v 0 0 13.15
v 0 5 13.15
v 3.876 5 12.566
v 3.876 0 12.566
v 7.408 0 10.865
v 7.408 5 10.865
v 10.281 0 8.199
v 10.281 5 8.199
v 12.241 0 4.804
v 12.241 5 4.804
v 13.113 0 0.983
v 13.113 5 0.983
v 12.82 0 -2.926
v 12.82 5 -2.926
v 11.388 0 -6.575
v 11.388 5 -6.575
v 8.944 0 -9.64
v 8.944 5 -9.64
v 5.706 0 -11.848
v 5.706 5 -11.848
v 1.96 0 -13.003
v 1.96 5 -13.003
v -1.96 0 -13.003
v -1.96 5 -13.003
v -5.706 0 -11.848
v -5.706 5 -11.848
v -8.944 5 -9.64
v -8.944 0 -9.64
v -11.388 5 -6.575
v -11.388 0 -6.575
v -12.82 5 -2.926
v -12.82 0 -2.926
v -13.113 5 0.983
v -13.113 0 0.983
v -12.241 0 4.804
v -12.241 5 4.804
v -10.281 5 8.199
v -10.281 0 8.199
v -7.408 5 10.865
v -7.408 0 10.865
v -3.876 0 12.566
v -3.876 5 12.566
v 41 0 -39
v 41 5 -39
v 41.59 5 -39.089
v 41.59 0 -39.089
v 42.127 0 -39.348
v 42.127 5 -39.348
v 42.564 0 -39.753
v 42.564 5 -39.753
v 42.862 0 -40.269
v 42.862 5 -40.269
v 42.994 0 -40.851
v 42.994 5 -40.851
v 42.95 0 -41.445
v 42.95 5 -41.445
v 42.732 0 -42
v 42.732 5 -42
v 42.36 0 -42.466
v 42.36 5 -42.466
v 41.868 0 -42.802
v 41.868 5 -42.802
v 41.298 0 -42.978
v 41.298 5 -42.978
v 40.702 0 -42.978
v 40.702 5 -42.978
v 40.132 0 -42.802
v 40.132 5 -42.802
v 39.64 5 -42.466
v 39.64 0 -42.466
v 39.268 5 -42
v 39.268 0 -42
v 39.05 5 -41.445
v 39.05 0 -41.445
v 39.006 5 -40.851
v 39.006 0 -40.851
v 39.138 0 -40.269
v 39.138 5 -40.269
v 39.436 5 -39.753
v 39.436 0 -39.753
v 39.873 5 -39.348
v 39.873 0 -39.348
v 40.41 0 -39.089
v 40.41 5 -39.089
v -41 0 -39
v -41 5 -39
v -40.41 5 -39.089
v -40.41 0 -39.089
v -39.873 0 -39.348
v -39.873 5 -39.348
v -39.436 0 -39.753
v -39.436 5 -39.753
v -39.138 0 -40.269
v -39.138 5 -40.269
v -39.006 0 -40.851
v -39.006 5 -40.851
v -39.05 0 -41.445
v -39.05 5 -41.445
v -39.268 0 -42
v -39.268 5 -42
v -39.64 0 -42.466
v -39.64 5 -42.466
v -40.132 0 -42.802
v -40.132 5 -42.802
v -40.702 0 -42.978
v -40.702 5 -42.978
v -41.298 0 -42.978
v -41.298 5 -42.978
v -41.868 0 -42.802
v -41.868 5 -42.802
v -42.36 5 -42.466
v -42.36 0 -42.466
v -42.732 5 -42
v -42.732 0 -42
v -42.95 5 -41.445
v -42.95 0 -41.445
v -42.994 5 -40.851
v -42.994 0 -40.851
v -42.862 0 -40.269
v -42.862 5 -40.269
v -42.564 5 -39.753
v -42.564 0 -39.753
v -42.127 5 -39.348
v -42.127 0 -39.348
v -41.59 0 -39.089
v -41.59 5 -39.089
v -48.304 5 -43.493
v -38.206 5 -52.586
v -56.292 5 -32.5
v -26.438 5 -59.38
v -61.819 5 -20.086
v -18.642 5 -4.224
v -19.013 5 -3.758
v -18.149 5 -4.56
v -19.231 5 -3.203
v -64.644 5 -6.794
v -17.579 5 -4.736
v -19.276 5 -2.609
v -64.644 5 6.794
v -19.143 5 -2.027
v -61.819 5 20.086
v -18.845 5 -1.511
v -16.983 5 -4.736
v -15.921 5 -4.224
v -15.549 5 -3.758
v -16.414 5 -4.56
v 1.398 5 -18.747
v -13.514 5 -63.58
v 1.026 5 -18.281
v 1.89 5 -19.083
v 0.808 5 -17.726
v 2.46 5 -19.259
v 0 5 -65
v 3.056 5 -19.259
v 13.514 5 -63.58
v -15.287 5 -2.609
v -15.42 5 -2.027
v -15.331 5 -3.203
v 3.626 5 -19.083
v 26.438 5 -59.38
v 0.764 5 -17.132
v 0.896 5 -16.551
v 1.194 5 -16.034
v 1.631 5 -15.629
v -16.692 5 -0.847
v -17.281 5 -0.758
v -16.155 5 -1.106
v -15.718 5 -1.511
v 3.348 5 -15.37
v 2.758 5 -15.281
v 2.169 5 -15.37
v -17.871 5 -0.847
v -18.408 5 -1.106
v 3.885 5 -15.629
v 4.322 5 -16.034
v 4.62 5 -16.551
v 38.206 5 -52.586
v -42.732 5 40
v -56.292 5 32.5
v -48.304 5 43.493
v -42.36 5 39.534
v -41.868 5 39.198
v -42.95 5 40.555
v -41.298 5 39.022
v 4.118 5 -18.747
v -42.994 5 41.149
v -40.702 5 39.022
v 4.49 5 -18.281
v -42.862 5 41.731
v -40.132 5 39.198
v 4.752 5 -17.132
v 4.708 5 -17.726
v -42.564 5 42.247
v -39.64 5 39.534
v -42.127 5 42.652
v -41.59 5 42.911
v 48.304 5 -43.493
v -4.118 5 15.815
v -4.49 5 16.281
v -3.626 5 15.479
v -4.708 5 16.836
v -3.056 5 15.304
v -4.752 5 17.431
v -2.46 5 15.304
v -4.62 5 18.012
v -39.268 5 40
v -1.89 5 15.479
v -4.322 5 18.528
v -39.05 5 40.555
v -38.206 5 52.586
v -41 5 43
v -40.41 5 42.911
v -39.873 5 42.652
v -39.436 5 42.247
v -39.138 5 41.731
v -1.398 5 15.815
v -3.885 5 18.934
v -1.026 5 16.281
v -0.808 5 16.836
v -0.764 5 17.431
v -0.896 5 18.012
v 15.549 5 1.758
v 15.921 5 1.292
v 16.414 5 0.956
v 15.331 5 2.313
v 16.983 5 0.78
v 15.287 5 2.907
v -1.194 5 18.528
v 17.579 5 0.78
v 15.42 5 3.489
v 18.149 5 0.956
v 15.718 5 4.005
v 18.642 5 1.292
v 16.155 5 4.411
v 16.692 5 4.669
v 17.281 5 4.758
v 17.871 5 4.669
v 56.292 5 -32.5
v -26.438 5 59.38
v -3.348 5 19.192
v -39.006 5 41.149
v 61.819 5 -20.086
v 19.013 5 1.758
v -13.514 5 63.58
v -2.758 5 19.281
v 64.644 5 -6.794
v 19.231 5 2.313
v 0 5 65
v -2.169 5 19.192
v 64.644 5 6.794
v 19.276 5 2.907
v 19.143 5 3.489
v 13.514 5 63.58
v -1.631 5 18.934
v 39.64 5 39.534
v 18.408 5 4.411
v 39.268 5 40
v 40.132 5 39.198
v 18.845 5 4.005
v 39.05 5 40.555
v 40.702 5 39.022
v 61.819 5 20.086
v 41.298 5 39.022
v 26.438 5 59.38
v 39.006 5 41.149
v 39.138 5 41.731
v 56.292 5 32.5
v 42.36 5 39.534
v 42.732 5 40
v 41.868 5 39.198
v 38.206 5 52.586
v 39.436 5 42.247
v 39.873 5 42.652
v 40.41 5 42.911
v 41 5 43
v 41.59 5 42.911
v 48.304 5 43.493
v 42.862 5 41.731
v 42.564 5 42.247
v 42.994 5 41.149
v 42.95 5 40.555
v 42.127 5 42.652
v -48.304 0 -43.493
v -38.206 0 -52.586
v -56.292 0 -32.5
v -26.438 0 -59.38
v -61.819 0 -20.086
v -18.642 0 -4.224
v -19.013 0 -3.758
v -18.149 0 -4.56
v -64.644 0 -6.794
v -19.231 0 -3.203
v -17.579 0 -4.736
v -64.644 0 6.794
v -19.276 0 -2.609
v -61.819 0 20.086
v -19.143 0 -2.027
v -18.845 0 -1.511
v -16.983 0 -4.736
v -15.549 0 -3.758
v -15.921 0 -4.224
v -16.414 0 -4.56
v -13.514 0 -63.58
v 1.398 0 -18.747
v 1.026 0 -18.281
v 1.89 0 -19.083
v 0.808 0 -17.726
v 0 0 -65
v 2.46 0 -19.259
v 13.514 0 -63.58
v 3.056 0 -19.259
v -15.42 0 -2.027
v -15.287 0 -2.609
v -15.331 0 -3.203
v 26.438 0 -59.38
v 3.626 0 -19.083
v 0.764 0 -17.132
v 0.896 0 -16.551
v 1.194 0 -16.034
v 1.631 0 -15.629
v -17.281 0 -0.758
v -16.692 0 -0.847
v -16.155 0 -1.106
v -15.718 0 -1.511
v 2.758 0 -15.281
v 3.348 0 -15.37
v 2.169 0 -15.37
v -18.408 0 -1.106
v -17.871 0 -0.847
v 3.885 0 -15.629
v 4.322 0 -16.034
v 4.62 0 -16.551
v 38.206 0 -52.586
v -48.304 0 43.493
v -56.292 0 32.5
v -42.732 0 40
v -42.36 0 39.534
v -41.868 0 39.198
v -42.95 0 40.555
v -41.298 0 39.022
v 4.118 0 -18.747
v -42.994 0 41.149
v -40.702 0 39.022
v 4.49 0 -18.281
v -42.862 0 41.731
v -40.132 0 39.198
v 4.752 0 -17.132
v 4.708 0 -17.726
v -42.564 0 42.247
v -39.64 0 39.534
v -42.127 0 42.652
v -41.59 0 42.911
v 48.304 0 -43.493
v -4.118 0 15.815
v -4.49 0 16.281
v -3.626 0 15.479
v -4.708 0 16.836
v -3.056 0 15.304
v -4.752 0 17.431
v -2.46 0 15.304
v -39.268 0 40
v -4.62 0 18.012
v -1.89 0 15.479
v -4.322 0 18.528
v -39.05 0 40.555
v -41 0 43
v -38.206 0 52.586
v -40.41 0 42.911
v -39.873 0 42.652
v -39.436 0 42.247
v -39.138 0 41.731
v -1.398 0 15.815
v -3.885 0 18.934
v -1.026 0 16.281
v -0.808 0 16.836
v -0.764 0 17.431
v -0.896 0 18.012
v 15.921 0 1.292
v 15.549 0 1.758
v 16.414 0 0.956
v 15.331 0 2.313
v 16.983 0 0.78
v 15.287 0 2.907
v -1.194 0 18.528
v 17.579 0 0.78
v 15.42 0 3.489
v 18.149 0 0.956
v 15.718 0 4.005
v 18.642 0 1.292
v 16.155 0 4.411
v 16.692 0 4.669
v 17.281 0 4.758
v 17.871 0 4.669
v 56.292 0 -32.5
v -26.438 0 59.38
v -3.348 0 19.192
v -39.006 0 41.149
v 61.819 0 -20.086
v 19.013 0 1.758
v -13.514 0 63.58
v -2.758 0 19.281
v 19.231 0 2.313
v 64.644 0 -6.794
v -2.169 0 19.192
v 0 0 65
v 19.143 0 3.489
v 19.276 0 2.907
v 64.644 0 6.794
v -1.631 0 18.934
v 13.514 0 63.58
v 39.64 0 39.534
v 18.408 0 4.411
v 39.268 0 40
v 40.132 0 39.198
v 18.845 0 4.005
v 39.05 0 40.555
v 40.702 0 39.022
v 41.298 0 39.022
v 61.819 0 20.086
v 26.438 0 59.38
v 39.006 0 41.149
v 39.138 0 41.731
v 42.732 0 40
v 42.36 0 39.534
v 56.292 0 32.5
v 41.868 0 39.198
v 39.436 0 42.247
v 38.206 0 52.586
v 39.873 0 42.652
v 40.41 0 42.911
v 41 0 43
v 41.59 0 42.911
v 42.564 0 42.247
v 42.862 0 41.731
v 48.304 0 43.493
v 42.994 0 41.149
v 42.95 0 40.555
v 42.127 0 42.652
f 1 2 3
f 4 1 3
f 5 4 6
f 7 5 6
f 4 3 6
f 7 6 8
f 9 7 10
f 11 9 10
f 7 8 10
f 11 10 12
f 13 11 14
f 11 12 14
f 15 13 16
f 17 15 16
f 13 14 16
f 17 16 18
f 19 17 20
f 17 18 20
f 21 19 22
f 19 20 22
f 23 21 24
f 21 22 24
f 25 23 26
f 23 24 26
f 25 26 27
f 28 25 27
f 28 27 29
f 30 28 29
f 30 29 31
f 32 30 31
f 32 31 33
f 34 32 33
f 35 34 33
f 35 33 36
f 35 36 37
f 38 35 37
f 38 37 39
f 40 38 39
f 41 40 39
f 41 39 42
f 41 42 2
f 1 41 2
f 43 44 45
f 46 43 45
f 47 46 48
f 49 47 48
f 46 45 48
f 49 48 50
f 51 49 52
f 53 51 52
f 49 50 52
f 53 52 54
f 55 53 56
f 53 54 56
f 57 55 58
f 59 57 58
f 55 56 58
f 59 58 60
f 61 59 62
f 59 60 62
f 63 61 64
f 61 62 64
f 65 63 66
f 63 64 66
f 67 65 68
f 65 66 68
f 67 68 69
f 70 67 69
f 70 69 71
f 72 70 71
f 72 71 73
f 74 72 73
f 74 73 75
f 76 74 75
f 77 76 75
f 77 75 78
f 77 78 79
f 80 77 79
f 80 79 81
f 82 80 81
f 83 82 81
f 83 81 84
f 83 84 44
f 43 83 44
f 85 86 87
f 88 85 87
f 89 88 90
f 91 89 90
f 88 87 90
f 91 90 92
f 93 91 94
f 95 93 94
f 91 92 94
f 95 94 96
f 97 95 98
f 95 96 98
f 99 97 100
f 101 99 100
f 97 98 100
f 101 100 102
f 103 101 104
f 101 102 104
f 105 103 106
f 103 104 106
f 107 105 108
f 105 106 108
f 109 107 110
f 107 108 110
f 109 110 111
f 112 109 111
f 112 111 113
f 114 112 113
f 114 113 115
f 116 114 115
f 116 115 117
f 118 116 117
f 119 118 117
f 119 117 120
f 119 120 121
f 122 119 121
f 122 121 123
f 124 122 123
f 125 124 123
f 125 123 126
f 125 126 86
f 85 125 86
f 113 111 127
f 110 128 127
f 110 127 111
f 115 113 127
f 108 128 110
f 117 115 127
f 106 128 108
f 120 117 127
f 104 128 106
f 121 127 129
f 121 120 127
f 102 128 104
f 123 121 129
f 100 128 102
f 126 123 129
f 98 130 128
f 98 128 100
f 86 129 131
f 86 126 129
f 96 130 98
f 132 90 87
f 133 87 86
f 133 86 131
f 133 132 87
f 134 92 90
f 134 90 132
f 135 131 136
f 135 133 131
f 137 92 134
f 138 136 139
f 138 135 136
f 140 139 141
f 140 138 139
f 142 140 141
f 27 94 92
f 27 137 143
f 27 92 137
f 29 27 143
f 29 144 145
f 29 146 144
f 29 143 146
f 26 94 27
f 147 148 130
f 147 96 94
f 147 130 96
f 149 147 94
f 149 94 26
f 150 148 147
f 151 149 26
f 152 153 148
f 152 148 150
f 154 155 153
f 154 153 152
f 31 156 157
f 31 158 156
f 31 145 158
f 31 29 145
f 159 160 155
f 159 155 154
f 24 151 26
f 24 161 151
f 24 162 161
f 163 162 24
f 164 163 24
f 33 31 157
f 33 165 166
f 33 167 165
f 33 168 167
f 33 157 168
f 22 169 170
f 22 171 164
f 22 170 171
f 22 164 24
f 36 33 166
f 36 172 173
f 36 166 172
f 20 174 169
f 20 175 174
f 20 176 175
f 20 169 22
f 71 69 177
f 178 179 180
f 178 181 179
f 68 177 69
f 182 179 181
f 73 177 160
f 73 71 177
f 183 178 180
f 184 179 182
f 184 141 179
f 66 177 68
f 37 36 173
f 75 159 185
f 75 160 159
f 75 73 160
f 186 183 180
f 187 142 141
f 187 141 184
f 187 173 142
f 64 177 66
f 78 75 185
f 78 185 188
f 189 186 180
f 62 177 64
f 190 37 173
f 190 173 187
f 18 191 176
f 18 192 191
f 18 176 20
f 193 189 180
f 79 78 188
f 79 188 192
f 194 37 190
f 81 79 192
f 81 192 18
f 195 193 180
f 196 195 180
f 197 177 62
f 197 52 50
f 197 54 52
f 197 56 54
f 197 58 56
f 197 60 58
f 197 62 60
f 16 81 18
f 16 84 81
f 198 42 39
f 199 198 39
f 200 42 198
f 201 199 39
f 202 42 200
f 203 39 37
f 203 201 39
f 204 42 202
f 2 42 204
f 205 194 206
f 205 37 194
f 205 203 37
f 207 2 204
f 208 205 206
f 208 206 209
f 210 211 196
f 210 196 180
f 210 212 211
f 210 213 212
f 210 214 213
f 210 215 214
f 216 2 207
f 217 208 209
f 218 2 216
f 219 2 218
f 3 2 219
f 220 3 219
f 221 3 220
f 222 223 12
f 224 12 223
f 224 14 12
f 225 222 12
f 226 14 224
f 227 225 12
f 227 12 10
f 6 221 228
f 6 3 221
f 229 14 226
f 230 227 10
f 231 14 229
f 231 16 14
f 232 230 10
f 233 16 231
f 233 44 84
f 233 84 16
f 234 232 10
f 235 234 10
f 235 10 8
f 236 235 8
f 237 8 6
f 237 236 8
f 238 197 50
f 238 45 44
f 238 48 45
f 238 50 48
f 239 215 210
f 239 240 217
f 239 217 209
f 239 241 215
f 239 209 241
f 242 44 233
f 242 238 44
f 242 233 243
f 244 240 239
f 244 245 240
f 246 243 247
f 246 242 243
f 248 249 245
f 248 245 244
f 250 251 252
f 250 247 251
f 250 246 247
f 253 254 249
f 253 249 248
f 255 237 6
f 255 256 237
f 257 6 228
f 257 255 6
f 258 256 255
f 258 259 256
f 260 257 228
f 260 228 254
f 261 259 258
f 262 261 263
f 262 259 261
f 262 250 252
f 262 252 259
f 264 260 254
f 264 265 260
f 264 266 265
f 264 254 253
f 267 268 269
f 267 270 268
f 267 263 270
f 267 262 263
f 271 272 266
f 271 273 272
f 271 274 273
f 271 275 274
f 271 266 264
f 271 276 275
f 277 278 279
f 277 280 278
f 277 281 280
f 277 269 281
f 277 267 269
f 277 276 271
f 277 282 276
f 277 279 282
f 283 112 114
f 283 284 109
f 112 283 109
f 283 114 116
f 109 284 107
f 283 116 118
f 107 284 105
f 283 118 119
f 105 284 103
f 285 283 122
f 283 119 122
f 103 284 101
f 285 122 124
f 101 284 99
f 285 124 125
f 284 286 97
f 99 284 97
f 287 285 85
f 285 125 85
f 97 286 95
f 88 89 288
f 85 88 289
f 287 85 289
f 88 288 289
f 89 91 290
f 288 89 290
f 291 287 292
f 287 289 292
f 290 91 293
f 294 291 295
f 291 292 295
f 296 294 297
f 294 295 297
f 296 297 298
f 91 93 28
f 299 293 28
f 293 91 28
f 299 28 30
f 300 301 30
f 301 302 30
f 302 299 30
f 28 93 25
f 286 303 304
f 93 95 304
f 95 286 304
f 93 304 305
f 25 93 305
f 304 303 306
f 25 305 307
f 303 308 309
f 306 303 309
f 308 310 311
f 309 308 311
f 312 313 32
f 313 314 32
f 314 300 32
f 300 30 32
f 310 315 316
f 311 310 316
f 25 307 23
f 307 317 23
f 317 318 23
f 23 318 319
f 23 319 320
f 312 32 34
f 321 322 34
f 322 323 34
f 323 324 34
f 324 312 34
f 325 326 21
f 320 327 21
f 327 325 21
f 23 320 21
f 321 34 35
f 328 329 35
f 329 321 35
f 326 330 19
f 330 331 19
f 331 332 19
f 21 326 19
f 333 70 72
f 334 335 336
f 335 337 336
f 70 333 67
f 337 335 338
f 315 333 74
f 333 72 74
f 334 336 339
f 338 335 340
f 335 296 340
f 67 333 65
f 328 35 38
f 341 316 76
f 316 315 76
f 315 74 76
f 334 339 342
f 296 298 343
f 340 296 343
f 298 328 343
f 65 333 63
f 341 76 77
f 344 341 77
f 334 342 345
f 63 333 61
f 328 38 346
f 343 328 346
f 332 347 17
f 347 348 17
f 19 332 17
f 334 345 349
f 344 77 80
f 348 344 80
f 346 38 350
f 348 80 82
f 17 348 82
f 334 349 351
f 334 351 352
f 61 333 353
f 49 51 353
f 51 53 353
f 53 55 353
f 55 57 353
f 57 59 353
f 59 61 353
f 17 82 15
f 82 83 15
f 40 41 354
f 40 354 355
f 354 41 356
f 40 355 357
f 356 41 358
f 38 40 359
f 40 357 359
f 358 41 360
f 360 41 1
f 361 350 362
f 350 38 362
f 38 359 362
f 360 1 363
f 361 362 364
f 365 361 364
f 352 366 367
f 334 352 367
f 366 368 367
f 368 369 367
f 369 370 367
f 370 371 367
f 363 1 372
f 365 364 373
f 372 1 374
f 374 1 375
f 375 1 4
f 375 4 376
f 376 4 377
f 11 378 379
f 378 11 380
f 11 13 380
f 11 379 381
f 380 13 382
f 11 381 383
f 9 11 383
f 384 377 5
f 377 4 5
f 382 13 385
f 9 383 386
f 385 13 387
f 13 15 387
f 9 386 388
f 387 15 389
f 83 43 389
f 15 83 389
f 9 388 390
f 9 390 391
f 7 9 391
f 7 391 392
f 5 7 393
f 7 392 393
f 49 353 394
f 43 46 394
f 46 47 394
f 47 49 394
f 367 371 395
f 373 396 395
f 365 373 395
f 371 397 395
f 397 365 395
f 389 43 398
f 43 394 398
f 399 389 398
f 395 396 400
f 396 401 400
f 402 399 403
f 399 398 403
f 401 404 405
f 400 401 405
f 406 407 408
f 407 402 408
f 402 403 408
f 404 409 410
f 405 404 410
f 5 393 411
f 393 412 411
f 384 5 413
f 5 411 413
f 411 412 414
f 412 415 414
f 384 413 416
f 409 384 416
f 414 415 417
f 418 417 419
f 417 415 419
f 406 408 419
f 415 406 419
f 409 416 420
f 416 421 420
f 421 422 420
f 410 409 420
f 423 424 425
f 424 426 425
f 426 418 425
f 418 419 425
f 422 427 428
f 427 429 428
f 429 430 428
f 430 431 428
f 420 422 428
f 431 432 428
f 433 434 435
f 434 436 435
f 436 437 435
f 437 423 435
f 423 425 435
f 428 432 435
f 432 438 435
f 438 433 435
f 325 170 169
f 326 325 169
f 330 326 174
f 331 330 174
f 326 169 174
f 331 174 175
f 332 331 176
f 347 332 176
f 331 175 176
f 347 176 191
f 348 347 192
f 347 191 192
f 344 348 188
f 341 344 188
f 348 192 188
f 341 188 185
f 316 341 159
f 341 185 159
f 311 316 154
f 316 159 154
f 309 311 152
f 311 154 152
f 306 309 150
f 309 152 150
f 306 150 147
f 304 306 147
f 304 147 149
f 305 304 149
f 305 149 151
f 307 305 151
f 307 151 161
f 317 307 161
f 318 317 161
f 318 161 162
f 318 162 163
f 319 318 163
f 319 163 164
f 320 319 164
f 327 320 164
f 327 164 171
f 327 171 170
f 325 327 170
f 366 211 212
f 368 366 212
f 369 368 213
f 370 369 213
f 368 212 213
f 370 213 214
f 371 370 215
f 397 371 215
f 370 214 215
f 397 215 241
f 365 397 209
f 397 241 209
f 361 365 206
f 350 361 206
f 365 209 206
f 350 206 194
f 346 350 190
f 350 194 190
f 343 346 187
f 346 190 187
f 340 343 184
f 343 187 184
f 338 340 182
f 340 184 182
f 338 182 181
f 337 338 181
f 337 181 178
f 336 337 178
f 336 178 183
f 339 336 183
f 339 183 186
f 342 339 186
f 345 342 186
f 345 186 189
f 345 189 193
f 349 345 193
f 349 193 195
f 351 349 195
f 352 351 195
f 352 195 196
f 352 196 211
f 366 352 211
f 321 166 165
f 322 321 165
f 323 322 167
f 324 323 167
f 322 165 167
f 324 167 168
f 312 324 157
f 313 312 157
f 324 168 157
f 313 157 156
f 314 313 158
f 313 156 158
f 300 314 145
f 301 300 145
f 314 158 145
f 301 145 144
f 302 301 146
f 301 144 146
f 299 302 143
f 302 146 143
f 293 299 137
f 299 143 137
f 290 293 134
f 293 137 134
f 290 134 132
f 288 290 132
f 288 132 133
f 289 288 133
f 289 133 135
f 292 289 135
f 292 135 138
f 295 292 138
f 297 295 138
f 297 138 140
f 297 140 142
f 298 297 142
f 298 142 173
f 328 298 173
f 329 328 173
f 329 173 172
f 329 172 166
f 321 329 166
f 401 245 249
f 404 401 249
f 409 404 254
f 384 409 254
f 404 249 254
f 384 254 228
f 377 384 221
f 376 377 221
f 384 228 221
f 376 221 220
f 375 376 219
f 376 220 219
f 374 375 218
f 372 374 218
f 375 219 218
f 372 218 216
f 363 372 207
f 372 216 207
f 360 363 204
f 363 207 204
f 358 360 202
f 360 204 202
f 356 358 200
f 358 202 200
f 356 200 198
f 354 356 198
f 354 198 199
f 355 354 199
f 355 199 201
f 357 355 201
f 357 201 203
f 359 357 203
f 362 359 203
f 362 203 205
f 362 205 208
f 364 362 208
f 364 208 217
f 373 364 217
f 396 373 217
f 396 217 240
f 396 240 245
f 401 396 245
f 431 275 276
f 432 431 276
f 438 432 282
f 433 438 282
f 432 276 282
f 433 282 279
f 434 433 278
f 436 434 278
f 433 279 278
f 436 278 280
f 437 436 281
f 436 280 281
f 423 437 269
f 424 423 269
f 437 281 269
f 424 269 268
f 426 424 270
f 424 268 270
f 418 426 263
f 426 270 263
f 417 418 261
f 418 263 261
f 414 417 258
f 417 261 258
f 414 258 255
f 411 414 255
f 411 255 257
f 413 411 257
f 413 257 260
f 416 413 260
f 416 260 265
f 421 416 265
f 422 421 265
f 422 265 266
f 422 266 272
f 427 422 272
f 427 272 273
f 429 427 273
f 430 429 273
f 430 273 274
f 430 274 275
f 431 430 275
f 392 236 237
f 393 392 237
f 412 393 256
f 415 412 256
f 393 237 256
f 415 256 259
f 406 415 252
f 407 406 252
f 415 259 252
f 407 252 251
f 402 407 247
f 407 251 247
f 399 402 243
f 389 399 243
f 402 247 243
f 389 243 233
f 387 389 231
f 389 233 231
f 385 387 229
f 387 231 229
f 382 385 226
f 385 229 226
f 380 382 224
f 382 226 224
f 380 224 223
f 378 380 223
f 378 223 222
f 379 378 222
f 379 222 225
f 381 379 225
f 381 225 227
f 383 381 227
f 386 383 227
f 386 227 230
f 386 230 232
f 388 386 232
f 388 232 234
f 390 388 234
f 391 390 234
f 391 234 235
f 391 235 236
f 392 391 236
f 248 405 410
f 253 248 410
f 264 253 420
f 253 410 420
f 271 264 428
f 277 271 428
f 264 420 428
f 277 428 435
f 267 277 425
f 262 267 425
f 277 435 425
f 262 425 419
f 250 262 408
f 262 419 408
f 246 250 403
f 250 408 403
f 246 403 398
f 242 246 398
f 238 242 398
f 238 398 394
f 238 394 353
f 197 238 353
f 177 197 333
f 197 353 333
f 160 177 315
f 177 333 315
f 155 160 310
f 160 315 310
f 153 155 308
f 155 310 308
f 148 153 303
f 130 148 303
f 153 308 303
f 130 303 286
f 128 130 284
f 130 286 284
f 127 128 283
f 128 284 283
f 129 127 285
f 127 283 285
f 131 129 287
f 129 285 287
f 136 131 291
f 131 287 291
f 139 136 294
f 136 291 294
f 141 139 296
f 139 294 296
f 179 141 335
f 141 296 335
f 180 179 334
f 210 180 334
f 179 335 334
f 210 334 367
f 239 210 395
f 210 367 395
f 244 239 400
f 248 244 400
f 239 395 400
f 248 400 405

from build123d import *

# Parameters (mm, degrees)
SKETCH1_R           = 65
BOSS_EXTRUDE1_DEPTH = 5
SKETCH2_R           = 13.15
SKETCH2_R_2         = 2
CUT_EXTRUDE1_DEPTH  = 93.059763198
SKETCH4_R           = 2
CUT_EXTRUDE2_DEPTH  = 93.059763198


with BuildPart() as part:
    # Sketch1 → Boss-Extrude1 (new body)
    with BuildSketch(Plane(origin=(0, 0, 0), x_dir=(1, 0, 0), z_dir=(0, 1, 0))):
        with Locations(Location((0, 0, 0), (0, 0, 270))):
            Circle(SKETCH1_R)
    extrude(amount=BOSS_EXTRUDE1_DEPTH)

    # Sketch2 → Cut-Extrude1 (cut, through all)
    with BuildSketch(Plane(origin=(0, 5, 0), x_dir=(1, 0, 0), z_dir=(0, 1, 0))):
        with Locations(Location((0, 0, 0), (0, 0, 270))):
            Circle(SKETCH2_R)
        with Locations(Location((-17.281297977, 2.75803195, 0), (0, 0, 270))):
            Circle(SKETCH2_R_2)
        with Locations(Location((2.75803195, 17.281297977, 0), (0, 0, 270))):
            Circle(SKETCH2_R_2)
        with Locations(Location((17.281297977, -2.75803195, 0), (0, 0, 270))):
            Circle(SKETCH2_R_2)
        with Locations(Location((-2.75803195, -17.281297977, 0), (0, 0, 270))):
            Circle(SKETCH2_R_2)
    extrude(amount=-CUT_EXTRUDE1_DEPTH, mode=Mode.SUBTRACT)

    # Sketch4 → Cut-Extrude2 (cut, through all)
    with BuildSketch(Plane(origin=(0, 5, 0), x_dir=(1, 0, 0), z_dir=(0, 1, 0))):
        with Locations(Location((41, 41, 0), (0, 0, 270))):
            Circle(SKETCH4_R)
        with Locations(Location((41, -41, 0), (0, 0, 270))):
            Circle(SKETCH4_R)
        with Locations(Location((-41, -41, 0), (0, 0, 270))):
            Circle(SKETCH4_R)
        with Locations(Location((-41, 41, 0), (0, 0, 270))):
            Circle(SKETCH4_R)
    extrude(amount=-CUT_EXTRUDE2_DEPTH, mode=Mode.SUBTRACT)


solid = part.part
